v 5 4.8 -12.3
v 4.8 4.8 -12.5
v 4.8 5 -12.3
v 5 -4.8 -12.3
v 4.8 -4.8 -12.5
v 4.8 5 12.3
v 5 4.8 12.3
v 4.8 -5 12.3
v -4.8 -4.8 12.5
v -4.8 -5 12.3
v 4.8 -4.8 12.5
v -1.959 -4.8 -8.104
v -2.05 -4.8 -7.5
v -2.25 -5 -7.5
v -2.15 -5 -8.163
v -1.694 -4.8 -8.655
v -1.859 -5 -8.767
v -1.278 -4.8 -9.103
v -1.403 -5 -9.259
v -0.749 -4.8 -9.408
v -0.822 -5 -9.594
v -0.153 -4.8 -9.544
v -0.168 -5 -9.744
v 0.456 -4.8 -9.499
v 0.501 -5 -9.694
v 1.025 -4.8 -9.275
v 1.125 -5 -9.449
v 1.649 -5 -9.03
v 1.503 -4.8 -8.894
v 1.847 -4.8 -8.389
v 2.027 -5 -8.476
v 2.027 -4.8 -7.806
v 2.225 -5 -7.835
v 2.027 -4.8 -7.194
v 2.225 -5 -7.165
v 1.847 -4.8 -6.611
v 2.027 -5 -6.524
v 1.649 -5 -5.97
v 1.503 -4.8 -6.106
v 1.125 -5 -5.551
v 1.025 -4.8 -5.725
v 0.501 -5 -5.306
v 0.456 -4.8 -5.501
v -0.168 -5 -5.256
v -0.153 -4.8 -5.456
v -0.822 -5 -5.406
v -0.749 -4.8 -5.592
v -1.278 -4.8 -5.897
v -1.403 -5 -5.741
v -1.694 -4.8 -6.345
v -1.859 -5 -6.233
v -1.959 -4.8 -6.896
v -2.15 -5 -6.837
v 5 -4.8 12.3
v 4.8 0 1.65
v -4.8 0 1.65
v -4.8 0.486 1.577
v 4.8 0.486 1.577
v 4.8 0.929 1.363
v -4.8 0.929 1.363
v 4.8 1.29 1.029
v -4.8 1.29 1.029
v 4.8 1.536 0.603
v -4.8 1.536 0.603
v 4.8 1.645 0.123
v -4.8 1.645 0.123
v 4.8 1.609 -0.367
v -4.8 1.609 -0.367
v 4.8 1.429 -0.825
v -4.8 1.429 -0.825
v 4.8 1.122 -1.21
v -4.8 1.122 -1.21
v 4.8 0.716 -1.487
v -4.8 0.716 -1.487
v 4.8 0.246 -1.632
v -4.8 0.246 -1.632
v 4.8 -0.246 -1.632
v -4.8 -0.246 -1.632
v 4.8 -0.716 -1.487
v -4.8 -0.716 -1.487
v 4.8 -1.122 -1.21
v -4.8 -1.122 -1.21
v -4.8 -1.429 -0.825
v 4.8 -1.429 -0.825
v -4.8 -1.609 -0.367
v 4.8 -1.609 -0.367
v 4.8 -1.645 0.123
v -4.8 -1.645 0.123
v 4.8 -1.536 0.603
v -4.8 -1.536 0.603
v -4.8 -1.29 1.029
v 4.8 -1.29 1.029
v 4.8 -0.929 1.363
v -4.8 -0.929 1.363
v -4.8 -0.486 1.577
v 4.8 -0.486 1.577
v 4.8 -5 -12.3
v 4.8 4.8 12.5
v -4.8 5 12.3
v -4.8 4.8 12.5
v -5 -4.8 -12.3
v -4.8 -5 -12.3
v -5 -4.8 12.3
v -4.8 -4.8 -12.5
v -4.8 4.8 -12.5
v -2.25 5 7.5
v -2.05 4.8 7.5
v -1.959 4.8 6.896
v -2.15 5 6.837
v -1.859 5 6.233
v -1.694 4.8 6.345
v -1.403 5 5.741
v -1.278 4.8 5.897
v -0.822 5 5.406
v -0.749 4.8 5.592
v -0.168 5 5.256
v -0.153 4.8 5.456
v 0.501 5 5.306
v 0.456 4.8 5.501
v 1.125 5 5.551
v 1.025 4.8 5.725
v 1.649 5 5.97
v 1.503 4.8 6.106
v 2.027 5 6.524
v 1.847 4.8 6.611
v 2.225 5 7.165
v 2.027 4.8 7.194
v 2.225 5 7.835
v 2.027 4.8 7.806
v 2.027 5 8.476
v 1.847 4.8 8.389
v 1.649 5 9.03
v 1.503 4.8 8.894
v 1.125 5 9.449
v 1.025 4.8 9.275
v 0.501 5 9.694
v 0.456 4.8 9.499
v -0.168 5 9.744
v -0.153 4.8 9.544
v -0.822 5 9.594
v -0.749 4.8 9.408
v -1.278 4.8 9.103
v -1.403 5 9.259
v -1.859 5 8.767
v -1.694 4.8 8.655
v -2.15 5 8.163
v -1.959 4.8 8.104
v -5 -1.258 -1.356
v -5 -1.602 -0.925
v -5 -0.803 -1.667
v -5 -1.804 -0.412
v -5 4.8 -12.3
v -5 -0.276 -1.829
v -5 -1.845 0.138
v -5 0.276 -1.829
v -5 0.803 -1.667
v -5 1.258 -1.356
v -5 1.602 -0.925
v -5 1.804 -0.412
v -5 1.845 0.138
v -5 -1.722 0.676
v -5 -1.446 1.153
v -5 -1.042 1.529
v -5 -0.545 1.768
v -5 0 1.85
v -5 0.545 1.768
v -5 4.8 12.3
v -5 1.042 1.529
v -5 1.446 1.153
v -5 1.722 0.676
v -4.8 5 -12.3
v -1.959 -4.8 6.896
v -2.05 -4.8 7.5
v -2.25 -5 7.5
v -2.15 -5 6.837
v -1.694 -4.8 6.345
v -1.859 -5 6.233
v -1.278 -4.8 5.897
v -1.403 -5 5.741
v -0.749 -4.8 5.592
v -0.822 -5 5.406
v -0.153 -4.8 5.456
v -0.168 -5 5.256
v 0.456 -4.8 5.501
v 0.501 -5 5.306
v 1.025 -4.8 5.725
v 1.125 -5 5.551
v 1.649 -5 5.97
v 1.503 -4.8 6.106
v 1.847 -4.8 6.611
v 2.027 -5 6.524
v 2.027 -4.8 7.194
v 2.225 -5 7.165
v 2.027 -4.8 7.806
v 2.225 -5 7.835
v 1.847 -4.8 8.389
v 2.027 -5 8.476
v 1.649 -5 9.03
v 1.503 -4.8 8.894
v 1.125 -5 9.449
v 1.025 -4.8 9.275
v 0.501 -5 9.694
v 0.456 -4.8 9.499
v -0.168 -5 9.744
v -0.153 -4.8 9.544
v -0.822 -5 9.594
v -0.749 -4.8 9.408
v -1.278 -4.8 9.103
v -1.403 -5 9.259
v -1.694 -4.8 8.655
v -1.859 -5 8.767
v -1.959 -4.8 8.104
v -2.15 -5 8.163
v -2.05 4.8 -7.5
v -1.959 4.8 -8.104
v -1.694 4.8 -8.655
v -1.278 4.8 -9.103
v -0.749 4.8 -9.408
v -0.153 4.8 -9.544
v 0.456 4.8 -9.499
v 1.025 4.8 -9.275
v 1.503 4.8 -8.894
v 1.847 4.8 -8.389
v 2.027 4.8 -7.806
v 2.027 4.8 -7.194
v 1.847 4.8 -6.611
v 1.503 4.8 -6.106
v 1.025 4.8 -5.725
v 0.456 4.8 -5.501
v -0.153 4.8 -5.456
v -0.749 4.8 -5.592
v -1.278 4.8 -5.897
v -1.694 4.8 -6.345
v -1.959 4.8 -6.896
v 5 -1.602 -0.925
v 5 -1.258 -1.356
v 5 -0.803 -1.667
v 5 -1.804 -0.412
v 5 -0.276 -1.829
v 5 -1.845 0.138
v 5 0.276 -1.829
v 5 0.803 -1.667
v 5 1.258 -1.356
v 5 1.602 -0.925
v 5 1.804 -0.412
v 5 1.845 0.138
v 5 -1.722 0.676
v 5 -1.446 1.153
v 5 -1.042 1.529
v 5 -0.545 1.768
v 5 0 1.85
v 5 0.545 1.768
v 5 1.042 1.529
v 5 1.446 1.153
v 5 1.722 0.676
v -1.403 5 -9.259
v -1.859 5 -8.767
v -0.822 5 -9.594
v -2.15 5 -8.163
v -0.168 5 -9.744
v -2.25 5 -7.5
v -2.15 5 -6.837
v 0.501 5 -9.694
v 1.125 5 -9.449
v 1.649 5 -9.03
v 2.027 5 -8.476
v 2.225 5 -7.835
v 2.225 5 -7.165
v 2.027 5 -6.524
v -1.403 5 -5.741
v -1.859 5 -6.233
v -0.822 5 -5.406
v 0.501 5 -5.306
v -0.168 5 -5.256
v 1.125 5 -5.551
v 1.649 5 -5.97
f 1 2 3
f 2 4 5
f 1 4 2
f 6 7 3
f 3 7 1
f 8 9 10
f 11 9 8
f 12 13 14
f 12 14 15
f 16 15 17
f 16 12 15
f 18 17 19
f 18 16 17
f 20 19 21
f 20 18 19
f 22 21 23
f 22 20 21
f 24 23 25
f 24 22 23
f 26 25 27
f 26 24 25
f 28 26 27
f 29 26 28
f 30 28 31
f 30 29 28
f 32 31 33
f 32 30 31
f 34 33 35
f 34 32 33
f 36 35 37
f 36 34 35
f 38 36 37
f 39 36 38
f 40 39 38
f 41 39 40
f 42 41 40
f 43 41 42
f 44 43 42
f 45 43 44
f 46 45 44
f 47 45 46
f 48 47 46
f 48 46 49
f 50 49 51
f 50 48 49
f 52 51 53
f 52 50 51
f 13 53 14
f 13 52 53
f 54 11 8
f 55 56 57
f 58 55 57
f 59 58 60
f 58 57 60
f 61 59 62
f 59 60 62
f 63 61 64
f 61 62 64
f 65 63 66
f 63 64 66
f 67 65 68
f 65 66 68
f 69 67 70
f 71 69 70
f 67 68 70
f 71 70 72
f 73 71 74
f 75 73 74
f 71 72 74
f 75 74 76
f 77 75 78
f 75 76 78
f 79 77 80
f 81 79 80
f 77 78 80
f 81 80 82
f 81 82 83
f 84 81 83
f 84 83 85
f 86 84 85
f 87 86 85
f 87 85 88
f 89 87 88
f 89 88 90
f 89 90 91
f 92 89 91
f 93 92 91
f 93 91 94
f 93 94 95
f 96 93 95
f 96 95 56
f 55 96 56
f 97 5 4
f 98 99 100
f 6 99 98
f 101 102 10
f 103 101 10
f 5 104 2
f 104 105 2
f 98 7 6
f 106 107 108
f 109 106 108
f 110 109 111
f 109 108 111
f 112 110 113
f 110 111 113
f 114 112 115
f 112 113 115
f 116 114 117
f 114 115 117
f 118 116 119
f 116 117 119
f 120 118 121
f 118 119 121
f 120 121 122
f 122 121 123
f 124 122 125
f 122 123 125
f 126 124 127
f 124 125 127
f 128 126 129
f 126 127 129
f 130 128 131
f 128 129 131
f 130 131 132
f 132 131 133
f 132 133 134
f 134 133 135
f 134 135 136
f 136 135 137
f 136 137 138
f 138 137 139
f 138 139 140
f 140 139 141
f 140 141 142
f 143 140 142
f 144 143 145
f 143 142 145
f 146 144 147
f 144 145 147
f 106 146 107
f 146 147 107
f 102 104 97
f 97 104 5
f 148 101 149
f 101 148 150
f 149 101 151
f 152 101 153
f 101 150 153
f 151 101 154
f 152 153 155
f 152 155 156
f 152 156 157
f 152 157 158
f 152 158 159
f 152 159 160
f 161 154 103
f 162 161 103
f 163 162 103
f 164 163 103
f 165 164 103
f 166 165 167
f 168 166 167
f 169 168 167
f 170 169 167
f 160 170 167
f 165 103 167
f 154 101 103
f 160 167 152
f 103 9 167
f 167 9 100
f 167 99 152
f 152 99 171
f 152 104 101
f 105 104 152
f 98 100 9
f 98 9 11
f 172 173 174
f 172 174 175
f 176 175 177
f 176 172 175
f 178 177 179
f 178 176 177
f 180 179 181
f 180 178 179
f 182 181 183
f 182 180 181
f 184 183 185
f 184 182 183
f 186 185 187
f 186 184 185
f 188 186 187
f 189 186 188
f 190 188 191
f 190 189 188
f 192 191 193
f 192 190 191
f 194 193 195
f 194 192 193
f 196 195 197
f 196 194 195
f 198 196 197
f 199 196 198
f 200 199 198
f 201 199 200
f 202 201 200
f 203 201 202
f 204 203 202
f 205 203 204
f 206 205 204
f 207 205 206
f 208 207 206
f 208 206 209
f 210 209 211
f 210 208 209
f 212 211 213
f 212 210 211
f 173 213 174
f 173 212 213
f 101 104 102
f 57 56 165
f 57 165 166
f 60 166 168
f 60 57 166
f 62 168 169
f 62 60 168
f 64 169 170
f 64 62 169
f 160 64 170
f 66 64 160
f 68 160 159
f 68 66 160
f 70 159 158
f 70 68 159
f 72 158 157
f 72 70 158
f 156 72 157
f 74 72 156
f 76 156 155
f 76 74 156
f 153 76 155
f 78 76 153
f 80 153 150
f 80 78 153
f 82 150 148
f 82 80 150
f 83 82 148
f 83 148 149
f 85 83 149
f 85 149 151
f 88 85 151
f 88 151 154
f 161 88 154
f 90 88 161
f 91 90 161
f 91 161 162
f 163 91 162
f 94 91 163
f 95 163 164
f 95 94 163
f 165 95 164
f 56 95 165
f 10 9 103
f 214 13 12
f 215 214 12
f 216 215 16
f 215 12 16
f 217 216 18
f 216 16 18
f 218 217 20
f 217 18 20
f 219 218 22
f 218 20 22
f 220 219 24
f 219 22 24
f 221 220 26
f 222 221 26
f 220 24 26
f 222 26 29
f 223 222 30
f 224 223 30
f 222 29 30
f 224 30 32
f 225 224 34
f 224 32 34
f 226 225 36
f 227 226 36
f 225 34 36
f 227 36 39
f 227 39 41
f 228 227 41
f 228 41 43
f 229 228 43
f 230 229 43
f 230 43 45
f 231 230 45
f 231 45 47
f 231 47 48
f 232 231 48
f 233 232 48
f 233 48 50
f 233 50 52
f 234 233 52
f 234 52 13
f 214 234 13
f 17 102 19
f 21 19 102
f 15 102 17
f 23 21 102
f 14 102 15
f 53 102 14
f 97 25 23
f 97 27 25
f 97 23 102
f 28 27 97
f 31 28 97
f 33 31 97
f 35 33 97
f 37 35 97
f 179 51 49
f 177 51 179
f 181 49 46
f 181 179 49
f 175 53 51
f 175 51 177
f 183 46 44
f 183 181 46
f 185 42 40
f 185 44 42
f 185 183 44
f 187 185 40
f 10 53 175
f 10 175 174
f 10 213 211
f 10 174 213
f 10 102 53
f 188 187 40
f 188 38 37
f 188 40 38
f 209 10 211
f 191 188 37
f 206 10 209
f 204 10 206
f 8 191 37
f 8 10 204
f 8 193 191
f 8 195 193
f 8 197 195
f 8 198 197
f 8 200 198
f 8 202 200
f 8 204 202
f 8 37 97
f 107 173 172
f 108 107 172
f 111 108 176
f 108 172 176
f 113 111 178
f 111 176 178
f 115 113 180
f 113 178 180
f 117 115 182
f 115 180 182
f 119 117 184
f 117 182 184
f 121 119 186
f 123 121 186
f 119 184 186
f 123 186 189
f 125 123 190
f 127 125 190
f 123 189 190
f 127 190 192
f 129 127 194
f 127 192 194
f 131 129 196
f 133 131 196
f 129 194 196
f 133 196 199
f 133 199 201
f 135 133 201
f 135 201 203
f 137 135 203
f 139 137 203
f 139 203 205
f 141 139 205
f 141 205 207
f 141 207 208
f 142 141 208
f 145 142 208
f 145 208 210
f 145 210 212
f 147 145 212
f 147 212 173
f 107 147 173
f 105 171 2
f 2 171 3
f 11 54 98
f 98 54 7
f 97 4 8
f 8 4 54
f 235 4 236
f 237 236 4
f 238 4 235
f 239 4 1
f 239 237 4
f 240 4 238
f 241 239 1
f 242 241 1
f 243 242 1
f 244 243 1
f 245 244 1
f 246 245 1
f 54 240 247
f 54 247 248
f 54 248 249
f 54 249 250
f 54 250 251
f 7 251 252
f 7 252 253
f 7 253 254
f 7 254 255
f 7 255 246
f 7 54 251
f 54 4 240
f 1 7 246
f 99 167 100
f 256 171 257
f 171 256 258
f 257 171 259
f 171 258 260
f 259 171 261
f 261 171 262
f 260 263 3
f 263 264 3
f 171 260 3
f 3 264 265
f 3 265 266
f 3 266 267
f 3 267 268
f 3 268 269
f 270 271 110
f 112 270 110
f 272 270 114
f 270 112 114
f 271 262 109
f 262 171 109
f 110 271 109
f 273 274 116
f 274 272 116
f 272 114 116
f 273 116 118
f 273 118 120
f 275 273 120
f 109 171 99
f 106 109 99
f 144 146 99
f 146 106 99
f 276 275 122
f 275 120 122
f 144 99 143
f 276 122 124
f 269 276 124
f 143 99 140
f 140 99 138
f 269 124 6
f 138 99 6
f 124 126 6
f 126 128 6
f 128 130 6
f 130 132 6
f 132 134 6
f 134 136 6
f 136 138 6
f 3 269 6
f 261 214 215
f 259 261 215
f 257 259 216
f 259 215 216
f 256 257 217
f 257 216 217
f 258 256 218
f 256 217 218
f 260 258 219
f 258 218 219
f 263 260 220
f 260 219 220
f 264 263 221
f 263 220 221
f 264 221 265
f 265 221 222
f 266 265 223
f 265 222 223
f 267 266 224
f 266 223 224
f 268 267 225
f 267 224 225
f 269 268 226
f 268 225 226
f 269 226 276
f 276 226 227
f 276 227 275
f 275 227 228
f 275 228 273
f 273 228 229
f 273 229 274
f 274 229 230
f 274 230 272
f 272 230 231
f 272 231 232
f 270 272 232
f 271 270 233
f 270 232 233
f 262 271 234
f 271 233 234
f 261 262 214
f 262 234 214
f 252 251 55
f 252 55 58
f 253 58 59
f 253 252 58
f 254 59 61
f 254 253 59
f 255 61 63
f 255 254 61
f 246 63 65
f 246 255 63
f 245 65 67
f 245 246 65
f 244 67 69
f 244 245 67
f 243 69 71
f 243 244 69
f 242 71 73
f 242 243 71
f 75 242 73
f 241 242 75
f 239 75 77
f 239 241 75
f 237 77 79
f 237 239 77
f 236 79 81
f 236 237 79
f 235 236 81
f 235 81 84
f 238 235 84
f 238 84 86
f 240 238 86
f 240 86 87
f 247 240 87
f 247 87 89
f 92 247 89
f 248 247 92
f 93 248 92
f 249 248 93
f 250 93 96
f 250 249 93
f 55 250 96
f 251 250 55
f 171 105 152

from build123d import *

# Parameters (mm, degrees)
SKETCH_1_W              = 10
SKETCH_1_H              = 10
EXTRUDE_1_DEPTH         = 12.5
HOLE_WIZARD_M4_1_D      = 3.3
HOLE_WIZARD_4_1_4_1_1_D = 4.1
CHAMFER_1_SIZE          = 0.2


with BuildPart() as part:
    # 草图1 → 凸台-拉伸1 (new, symmetric)
    with BuildSketch(Plane.XY):
        Rectangle(SKETCH_1_W, SKETCH_1_H)
    extrude(amount=EXTRUDE_1_DEPTH, both=True)

    # M4 螺纹孔1 (through all)
    with Locations(Plane(origin=(5, 0, 0), x_dir=(0, 0, -1), z_dir=(1, 0, 0))):
        with Locations((0, 0)):
            Hole(HOLE_WIZARD_M4_1_D / 2)

    # Ø4.1 (4.1) 直径孔1 (through all)
    with Locations(Plane(origin=(0, 5, 0), x_dir=(1, 0, 0), z_dir=(0, 1, 0))):
        with Locations((0, -7.5), (0, 7.5)):
            Hole(HOLE_WIZARD_4_1_4_1_1_D / 2)

    # 倒角1
    chamfer_1_edges = [part.edges().sort_by_distance(p)[0] for p in [
        (-5, 0, 12.5),
        (5, 0, -1.65),
        (-5, 0, -1.65),
        (0, -5, 12.5),
        (2.05, 5, -7.5),
        (2.05, -5, -7.5),
        (2.05, 5, 7.5),
        (2.05, -5, 7.5),
        (5, 0, 12.5),
        (0, -5, -12.5),
        (-5, 0, -12.5),
        (0, 5, -12.5),
        (5, 0, -12.5),
        (5, -5, 0),
        (-5, -5, 0),
        (-5, 5, 0),
        (5, 5, 0),
        (0, 5, 12.5),
    ]]
    chamfer(chamfer_1_edges, length=CHAMFER_1_SIZE)


solid = part.part
